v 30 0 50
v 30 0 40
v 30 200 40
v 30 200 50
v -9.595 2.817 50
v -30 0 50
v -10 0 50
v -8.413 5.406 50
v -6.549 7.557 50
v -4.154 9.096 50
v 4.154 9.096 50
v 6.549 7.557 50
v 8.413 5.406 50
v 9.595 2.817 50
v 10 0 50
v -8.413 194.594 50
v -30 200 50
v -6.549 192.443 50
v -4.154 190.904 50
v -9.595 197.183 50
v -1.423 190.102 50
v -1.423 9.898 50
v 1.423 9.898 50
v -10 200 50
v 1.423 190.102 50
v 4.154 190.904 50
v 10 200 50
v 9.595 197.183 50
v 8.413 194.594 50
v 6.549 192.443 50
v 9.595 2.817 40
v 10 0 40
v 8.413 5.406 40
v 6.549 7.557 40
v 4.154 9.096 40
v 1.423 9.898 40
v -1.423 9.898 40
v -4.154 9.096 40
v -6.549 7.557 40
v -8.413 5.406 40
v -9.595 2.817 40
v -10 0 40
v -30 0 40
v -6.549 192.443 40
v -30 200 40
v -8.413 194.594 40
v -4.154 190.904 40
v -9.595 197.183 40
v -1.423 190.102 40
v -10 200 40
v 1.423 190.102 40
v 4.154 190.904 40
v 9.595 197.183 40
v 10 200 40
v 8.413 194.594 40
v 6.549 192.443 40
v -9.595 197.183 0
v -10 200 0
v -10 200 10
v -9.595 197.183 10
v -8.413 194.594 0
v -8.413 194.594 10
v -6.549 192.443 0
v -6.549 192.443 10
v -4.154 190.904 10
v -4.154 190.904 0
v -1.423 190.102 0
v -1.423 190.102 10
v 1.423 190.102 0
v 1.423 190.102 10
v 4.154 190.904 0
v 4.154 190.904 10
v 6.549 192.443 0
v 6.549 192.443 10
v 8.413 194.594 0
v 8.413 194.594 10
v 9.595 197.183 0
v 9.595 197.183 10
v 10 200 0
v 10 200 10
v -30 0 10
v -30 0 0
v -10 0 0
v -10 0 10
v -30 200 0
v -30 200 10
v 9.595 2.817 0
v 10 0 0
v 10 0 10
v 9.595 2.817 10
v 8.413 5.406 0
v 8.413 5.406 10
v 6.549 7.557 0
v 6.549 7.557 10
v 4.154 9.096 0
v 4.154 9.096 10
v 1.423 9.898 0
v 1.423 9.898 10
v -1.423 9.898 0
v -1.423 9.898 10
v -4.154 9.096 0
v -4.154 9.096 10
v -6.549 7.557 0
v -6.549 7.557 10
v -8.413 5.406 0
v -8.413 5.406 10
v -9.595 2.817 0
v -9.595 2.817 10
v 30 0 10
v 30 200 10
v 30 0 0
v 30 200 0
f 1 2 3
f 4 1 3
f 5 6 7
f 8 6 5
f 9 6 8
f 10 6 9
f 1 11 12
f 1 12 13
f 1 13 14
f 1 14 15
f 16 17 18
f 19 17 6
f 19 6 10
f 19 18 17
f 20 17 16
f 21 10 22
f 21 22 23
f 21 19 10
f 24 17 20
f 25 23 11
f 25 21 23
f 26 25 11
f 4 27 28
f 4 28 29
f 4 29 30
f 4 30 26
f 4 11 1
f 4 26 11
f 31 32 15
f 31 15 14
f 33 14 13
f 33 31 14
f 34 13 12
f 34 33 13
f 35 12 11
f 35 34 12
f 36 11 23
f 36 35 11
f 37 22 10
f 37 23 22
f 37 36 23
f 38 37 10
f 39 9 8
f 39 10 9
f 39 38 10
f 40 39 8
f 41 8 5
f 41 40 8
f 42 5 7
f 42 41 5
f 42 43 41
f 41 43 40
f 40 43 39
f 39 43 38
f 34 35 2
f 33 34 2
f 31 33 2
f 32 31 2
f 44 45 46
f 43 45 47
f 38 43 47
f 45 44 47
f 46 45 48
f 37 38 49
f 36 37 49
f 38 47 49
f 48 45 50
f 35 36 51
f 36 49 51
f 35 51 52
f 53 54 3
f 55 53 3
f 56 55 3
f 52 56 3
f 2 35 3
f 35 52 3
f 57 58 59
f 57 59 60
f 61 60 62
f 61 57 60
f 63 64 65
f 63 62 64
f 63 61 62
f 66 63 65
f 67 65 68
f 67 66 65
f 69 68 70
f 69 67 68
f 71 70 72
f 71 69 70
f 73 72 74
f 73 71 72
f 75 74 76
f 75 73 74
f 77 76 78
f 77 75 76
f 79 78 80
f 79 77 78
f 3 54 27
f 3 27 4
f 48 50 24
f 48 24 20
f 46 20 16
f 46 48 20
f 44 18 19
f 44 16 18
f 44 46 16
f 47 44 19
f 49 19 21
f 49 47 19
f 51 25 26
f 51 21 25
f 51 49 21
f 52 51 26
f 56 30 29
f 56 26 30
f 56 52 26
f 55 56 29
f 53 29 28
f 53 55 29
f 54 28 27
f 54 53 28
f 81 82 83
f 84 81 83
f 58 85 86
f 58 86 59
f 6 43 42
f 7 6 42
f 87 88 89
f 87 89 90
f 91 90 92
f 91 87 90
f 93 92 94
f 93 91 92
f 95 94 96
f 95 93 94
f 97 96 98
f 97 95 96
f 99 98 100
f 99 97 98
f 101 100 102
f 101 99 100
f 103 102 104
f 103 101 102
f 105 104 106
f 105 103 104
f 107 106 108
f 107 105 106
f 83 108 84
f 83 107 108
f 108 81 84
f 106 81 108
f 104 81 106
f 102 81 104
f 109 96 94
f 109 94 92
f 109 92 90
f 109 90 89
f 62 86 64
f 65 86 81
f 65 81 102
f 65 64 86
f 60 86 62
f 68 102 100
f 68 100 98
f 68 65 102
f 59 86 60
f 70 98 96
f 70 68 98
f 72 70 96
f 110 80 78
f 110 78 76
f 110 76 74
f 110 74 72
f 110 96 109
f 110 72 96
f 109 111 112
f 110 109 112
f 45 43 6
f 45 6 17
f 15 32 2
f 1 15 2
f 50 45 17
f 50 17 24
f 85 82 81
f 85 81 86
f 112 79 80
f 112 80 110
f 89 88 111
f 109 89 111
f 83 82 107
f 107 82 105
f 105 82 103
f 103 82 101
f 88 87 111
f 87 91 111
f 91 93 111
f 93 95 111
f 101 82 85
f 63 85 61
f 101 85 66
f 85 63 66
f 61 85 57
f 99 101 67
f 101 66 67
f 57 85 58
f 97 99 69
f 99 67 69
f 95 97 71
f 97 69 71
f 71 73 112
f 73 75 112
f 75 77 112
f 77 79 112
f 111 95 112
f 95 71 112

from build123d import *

# Parameters (mm, degrees)
SKETCH1_W           = 60
SKETCH1_H           = 200
BOSS_EXTRUDE1_DEPTH = 10
SKETCH2_W           = 60
SKETCH2_H           = 200
BOSS_EXTRUDE2_DEPTH = 10
SKETCH3_R           = 10
CUT_EXTRUDE1_DEPTH  = 100


with BuildPart() as part:
    # Sketch1 → Boss-Extrude1 (new body)
    with BuildSketch(Plane.XY):
        with Locations((0, 100)):
            Rectangle(SKETCH1_W, SKETCH1_H)
    extrude(amount=BOSS_EXTRUDE1_DEPTH)


with BuildPart() as body_2:
    # Sketch2 → Boss-Extrude2 (new body)
    with BuildSketch(Plane.XY.offset(40)):
        with Locations((0, 100)):
            Rectangle(SKETCH2_W, SKETCH2_H)
    extrude(amount=BOSS_EXTRUDE2_DEPTH)


with BuildPart() as cut_extrude1_tool:
    # Sketch3 → Cut-Extrude1 (new body)
    with BuildSketch(Plane.XY):
        Circle(SKETCH3_R)
        with Locations((0, 200)):
            Circle(SKETCH3_R)
    extrude(amount=CUT_EXTRUDE1_DEPTH)


with BuildPart() as part_1:
    add(part.part)

    # Cut-Extrude1: cut by cut_extrude1_tool
    add(cut_extrude1_tool.part, mode=Mode.SUBTRACT)


with BuildPart() as body_2_1:
    add(body_2.part)

    # Cut-Extrude1: cut by cut_extrude1_tool
    add(cut_extrude1_tool.part, mode=Mode.SUBTRACT)


solid = Compound([part_1.part, body_2_1.part])
